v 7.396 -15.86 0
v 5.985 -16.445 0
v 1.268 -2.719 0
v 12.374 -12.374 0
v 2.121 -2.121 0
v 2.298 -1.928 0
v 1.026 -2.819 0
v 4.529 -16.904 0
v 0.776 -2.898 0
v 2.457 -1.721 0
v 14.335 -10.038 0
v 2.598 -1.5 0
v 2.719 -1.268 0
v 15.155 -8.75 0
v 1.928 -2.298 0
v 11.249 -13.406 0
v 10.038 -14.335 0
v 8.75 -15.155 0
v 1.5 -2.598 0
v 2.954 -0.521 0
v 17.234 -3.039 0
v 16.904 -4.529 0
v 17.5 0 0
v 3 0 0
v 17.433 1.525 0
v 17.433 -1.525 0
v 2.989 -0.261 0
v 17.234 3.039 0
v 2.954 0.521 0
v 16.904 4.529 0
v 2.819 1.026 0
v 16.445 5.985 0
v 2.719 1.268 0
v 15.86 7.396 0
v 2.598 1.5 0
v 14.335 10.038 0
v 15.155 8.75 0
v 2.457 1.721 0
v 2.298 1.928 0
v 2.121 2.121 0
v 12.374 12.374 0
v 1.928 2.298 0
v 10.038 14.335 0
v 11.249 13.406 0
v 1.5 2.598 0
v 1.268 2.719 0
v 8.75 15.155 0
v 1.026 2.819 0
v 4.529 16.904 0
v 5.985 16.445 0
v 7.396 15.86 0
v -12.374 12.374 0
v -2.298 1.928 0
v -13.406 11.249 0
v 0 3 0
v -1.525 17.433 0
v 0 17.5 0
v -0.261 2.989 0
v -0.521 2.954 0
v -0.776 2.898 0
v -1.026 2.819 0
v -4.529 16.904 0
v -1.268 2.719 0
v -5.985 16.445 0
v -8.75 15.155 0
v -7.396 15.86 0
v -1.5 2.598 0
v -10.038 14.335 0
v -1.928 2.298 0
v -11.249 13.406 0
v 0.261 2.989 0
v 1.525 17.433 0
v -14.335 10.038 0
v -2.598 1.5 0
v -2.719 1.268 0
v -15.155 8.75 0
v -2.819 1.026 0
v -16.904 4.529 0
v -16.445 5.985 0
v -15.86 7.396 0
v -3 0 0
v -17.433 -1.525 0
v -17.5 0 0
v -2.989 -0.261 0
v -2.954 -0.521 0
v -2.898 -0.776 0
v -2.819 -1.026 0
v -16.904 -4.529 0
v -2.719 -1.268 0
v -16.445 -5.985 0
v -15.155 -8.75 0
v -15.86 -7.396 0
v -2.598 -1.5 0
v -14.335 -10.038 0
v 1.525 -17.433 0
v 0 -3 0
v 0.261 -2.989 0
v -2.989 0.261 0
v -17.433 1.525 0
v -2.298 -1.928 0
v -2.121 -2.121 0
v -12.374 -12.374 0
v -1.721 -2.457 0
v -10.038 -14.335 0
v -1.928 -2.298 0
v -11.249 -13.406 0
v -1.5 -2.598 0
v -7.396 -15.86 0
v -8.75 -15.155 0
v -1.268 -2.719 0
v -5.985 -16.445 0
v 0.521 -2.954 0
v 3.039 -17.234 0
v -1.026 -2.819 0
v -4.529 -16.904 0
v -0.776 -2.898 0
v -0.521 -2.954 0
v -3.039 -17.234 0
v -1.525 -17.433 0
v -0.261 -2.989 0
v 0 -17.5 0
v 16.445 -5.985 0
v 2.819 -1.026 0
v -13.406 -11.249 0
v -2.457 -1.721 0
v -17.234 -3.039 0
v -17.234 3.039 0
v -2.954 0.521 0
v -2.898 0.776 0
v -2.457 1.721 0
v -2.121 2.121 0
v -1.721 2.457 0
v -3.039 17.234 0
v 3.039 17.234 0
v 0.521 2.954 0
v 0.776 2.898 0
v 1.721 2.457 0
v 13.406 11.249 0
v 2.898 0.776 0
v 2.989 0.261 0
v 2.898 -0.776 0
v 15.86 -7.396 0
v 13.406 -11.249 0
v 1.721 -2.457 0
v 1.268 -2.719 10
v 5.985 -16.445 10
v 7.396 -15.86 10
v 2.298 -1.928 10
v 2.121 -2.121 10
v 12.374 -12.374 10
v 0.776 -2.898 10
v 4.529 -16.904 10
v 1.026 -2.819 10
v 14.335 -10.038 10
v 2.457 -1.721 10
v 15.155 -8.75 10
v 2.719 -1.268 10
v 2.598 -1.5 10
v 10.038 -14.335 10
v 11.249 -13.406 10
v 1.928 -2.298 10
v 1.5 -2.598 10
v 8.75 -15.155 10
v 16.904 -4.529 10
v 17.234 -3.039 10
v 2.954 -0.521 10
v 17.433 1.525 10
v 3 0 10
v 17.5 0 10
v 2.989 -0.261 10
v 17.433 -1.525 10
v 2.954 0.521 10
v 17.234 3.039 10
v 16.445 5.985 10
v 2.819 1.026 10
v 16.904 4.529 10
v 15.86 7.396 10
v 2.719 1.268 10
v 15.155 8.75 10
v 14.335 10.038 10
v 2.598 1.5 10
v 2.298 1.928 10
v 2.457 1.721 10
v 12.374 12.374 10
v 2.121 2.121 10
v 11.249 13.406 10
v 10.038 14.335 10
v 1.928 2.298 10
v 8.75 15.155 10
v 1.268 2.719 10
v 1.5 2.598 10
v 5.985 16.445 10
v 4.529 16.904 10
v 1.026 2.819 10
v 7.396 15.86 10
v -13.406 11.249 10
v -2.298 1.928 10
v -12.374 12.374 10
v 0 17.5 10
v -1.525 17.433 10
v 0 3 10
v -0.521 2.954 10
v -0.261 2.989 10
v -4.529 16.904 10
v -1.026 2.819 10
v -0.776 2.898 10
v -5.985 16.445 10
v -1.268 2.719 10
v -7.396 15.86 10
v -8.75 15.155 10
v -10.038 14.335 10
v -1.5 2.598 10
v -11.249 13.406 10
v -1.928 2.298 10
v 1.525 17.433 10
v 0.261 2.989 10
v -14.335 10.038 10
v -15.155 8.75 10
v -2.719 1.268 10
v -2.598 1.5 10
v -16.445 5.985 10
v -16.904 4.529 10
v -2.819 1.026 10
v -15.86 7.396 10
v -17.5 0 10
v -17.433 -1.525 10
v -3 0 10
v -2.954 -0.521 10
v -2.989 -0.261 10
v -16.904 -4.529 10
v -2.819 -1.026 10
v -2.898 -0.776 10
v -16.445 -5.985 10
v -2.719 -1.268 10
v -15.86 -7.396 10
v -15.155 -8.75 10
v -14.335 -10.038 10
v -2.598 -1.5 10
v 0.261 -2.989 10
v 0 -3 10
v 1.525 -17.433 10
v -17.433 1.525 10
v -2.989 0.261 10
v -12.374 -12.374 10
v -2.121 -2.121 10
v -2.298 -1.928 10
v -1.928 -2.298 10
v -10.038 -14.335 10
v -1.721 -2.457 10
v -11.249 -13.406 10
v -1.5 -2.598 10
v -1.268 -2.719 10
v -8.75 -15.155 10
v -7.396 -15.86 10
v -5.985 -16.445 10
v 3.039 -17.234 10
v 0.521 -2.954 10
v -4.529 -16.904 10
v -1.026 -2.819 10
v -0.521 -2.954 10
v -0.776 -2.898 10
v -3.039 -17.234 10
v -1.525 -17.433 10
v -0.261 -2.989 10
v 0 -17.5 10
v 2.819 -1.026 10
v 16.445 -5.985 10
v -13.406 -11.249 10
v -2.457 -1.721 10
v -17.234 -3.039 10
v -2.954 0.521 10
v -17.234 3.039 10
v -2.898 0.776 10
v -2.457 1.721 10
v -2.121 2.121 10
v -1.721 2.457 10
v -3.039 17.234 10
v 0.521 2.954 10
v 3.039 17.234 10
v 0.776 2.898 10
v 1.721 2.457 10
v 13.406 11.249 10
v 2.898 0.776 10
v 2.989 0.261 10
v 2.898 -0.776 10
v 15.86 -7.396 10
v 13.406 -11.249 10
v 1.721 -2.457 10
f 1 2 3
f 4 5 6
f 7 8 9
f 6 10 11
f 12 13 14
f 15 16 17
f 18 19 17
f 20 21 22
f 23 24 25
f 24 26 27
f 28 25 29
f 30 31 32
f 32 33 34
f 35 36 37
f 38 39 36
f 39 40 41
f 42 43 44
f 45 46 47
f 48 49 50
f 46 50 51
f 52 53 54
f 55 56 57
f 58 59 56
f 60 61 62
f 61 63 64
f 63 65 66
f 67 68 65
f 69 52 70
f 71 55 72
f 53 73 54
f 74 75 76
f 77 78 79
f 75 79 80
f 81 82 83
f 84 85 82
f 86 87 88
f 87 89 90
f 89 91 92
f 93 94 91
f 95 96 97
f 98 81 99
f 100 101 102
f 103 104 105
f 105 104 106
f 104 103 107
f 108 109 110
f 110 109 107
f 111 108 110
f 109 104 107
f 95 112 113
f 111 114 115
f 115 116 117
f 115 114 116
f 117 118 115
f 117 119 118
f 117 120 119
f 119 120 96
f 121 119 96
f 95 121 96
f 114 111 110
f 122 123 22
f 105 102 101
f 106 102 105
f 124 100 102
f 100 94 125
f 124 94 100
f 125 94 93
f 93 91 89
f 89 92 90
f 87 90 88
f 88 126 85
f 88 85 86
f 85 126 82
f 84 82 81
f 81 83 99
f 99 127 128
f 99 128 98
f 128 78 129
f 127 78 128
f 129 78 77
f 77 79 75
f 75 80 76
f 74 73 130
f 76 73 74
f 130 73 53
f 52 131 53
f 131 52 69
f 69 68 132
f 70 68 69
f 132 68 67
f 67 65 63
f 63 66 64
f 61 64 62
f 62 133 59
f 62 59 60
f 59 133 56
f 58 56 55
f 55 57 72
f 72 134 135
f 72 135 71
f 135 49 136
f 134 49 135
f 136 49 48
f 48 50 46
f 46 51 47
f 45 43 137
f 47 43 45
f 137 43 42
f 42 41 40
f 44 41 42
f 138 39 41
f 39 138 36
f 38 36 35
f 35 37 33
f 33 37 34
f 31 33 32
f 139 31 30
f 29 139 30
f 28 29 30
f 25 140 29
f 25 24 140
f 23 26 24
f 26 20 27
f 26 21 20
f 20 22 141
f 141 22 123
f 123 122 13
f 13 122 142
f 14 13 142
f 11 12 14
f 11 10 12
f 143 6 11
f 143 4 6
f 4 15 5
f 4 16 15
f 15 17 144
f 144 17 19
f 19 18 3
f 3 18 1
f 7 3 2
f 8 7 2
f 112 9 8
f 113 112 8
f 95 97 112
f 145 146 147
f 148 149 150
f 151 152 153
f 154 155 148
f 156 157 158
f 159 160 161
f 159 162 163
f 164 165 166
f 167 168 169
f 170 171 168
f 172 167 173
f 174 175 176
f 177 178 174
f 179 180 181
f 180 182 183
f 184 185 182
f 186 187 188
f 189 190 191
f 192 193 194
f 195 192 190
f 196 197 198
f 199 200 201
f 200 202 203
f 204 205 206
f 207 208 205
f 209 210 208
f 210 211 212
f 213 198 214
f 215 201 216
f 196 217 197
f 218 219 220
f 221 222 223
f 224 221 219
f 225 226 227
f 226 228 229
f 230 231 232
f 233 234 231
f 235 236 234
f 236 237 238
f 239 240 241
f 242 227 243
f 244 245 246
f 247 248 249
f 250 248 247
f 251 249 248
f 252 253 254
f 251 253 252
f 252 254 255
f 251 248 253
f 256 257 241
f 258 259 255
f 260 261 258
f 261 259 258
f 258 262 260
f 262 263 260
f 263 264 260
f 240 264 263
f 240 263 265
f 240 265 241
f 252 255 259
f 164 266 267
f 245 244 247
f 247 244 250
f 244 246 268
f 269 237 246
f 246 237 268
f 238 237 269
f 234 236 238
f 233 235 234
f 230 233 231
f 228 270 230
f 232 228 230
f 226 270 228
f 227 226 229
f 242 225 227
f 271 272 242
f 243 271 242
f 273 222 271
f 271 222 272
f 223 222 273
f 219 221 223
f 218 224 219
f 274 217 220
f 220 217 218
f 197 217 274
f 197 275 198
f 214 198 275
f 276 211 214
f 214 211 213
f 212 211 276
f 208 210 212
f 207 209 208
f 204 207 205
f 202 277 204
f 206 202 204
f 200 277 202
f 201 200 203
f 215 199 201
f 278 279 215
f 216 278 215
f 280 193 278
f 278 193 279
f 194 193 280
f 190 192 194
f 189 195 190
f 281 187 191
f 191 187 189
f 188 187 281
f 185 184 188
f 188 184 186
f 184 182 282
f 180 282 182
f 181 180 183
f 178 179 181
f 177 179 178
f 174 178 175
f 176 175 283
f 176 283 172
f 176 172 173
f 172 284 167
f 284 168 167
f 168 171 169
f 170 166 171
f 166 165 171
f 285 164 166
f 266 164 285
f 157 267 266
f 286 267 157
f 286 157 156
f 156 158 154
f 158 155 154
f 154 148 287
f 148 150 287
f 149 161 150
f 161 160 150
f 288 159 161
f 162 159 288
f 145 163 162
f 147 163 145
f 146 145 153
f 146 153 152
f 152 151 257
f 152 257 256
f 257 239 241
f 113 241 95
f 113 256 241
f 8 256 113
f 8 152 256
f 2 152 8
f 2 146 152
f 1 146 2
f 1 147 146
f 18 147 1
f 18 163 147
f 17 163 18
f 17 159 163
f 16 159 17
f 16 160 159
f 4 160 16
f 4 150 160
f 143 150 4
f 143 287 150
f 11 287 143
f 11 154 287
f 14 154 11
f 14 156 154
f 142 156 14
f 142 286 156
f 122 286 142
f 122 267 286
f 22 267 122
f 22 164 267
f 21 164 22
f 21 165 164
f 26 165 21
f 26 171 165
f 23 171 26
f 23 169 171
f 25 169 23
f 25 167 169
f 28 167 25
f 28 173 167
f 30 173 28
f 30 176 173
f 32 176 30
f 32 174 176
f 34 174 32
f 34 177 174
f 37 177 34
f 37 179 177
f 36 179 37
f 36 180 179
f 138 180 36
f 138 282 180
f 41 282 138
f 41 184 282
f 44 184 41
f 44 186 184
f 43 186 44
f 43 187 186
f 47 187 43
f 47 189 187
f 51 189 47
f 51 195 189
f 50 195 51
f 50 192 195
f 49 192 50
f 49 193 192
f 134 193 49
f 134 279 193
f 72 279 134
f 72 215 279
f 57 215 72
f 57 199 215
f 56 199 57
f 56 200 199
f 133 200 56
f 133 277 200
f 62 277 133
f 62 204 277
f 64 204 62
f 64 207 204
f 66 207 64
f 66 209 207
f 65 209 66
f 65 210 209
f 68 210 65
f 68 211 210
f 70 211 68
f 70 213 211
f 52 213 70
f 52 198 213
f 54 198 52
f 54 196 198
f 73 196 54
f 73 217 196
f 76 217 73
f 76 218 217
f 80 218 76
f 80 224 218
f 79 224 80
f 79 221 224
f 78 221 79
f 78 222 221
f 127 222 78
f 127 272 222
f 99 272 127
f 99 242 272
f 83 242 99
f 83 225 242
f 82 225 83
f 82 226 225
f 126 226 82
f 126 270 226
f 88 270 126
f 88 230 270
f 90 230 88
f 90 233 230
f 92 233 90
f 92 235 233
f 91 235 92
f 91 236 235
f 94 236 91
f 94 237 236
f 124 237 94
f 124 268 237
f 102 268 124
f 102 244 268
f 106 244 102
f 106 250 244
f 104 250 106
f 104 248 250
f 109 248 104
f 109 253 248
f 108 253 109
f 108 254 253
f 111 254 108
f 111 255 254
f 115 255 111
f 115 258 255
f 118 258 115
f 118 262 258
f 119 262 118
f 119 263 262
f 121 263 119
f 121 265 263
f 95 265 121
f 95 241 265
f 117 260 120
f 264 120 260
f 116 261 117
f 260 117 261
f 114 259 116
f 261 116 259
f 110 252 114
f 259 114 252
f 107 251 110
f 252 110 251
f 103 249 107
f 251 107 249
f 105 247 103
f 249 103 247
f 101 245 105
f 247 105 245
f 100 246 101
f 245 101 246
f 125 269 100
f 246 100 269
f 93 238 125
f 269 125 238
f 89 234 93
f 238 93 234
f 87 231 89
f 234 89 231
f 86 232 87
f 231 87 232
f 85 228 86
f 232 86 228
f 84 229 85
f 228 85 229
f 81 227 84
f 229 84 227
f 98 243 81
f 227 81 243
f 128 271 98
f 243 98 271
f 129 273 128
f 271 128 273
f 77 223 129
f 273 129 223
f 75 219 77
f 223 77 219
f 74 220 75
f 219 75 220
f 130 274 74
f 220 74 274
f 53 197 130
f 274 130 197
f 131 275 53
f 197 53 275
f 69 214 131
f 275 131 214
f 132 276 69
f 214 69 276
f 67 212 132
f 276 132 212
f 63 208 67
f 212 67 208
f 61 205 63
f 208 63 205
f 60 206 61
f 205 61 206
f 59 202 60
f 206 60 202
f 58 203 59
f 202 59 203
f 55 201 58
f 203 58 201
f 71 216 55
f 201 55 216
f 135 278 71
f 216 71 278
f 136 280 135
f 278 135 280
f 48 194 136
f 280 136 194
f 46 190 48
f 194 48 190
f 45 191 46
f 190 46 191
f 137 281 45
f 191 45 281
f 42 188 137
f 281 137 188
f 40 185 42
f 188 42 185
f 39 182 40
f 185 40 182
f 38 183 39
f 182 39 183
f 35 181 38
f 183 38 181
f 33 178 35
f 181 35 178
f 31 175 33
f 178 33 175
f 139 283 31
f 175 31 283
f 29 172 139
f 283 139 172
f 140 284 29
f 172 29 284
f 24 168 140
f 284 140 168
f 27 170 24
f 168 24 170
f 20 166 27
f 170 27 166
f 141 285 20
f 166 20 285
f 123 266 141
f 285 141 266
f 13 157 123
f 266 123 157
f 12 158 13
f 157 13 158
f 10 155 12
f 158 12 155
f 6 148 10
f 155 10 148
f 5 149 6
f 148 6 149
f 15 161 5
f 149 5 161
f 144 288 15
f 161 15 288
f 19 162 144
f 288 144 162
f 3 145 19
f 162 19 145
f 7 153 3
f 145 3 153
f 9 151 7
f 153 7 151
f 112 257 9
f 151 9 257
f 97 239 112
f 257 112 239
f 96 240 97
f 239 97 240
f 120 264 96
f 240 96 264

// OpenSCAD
$fa=5;$fs=.1;
// NH-B406APC

linear_extrude(10)difference(){
	circle(d=35);
	circle(d=6);
}
